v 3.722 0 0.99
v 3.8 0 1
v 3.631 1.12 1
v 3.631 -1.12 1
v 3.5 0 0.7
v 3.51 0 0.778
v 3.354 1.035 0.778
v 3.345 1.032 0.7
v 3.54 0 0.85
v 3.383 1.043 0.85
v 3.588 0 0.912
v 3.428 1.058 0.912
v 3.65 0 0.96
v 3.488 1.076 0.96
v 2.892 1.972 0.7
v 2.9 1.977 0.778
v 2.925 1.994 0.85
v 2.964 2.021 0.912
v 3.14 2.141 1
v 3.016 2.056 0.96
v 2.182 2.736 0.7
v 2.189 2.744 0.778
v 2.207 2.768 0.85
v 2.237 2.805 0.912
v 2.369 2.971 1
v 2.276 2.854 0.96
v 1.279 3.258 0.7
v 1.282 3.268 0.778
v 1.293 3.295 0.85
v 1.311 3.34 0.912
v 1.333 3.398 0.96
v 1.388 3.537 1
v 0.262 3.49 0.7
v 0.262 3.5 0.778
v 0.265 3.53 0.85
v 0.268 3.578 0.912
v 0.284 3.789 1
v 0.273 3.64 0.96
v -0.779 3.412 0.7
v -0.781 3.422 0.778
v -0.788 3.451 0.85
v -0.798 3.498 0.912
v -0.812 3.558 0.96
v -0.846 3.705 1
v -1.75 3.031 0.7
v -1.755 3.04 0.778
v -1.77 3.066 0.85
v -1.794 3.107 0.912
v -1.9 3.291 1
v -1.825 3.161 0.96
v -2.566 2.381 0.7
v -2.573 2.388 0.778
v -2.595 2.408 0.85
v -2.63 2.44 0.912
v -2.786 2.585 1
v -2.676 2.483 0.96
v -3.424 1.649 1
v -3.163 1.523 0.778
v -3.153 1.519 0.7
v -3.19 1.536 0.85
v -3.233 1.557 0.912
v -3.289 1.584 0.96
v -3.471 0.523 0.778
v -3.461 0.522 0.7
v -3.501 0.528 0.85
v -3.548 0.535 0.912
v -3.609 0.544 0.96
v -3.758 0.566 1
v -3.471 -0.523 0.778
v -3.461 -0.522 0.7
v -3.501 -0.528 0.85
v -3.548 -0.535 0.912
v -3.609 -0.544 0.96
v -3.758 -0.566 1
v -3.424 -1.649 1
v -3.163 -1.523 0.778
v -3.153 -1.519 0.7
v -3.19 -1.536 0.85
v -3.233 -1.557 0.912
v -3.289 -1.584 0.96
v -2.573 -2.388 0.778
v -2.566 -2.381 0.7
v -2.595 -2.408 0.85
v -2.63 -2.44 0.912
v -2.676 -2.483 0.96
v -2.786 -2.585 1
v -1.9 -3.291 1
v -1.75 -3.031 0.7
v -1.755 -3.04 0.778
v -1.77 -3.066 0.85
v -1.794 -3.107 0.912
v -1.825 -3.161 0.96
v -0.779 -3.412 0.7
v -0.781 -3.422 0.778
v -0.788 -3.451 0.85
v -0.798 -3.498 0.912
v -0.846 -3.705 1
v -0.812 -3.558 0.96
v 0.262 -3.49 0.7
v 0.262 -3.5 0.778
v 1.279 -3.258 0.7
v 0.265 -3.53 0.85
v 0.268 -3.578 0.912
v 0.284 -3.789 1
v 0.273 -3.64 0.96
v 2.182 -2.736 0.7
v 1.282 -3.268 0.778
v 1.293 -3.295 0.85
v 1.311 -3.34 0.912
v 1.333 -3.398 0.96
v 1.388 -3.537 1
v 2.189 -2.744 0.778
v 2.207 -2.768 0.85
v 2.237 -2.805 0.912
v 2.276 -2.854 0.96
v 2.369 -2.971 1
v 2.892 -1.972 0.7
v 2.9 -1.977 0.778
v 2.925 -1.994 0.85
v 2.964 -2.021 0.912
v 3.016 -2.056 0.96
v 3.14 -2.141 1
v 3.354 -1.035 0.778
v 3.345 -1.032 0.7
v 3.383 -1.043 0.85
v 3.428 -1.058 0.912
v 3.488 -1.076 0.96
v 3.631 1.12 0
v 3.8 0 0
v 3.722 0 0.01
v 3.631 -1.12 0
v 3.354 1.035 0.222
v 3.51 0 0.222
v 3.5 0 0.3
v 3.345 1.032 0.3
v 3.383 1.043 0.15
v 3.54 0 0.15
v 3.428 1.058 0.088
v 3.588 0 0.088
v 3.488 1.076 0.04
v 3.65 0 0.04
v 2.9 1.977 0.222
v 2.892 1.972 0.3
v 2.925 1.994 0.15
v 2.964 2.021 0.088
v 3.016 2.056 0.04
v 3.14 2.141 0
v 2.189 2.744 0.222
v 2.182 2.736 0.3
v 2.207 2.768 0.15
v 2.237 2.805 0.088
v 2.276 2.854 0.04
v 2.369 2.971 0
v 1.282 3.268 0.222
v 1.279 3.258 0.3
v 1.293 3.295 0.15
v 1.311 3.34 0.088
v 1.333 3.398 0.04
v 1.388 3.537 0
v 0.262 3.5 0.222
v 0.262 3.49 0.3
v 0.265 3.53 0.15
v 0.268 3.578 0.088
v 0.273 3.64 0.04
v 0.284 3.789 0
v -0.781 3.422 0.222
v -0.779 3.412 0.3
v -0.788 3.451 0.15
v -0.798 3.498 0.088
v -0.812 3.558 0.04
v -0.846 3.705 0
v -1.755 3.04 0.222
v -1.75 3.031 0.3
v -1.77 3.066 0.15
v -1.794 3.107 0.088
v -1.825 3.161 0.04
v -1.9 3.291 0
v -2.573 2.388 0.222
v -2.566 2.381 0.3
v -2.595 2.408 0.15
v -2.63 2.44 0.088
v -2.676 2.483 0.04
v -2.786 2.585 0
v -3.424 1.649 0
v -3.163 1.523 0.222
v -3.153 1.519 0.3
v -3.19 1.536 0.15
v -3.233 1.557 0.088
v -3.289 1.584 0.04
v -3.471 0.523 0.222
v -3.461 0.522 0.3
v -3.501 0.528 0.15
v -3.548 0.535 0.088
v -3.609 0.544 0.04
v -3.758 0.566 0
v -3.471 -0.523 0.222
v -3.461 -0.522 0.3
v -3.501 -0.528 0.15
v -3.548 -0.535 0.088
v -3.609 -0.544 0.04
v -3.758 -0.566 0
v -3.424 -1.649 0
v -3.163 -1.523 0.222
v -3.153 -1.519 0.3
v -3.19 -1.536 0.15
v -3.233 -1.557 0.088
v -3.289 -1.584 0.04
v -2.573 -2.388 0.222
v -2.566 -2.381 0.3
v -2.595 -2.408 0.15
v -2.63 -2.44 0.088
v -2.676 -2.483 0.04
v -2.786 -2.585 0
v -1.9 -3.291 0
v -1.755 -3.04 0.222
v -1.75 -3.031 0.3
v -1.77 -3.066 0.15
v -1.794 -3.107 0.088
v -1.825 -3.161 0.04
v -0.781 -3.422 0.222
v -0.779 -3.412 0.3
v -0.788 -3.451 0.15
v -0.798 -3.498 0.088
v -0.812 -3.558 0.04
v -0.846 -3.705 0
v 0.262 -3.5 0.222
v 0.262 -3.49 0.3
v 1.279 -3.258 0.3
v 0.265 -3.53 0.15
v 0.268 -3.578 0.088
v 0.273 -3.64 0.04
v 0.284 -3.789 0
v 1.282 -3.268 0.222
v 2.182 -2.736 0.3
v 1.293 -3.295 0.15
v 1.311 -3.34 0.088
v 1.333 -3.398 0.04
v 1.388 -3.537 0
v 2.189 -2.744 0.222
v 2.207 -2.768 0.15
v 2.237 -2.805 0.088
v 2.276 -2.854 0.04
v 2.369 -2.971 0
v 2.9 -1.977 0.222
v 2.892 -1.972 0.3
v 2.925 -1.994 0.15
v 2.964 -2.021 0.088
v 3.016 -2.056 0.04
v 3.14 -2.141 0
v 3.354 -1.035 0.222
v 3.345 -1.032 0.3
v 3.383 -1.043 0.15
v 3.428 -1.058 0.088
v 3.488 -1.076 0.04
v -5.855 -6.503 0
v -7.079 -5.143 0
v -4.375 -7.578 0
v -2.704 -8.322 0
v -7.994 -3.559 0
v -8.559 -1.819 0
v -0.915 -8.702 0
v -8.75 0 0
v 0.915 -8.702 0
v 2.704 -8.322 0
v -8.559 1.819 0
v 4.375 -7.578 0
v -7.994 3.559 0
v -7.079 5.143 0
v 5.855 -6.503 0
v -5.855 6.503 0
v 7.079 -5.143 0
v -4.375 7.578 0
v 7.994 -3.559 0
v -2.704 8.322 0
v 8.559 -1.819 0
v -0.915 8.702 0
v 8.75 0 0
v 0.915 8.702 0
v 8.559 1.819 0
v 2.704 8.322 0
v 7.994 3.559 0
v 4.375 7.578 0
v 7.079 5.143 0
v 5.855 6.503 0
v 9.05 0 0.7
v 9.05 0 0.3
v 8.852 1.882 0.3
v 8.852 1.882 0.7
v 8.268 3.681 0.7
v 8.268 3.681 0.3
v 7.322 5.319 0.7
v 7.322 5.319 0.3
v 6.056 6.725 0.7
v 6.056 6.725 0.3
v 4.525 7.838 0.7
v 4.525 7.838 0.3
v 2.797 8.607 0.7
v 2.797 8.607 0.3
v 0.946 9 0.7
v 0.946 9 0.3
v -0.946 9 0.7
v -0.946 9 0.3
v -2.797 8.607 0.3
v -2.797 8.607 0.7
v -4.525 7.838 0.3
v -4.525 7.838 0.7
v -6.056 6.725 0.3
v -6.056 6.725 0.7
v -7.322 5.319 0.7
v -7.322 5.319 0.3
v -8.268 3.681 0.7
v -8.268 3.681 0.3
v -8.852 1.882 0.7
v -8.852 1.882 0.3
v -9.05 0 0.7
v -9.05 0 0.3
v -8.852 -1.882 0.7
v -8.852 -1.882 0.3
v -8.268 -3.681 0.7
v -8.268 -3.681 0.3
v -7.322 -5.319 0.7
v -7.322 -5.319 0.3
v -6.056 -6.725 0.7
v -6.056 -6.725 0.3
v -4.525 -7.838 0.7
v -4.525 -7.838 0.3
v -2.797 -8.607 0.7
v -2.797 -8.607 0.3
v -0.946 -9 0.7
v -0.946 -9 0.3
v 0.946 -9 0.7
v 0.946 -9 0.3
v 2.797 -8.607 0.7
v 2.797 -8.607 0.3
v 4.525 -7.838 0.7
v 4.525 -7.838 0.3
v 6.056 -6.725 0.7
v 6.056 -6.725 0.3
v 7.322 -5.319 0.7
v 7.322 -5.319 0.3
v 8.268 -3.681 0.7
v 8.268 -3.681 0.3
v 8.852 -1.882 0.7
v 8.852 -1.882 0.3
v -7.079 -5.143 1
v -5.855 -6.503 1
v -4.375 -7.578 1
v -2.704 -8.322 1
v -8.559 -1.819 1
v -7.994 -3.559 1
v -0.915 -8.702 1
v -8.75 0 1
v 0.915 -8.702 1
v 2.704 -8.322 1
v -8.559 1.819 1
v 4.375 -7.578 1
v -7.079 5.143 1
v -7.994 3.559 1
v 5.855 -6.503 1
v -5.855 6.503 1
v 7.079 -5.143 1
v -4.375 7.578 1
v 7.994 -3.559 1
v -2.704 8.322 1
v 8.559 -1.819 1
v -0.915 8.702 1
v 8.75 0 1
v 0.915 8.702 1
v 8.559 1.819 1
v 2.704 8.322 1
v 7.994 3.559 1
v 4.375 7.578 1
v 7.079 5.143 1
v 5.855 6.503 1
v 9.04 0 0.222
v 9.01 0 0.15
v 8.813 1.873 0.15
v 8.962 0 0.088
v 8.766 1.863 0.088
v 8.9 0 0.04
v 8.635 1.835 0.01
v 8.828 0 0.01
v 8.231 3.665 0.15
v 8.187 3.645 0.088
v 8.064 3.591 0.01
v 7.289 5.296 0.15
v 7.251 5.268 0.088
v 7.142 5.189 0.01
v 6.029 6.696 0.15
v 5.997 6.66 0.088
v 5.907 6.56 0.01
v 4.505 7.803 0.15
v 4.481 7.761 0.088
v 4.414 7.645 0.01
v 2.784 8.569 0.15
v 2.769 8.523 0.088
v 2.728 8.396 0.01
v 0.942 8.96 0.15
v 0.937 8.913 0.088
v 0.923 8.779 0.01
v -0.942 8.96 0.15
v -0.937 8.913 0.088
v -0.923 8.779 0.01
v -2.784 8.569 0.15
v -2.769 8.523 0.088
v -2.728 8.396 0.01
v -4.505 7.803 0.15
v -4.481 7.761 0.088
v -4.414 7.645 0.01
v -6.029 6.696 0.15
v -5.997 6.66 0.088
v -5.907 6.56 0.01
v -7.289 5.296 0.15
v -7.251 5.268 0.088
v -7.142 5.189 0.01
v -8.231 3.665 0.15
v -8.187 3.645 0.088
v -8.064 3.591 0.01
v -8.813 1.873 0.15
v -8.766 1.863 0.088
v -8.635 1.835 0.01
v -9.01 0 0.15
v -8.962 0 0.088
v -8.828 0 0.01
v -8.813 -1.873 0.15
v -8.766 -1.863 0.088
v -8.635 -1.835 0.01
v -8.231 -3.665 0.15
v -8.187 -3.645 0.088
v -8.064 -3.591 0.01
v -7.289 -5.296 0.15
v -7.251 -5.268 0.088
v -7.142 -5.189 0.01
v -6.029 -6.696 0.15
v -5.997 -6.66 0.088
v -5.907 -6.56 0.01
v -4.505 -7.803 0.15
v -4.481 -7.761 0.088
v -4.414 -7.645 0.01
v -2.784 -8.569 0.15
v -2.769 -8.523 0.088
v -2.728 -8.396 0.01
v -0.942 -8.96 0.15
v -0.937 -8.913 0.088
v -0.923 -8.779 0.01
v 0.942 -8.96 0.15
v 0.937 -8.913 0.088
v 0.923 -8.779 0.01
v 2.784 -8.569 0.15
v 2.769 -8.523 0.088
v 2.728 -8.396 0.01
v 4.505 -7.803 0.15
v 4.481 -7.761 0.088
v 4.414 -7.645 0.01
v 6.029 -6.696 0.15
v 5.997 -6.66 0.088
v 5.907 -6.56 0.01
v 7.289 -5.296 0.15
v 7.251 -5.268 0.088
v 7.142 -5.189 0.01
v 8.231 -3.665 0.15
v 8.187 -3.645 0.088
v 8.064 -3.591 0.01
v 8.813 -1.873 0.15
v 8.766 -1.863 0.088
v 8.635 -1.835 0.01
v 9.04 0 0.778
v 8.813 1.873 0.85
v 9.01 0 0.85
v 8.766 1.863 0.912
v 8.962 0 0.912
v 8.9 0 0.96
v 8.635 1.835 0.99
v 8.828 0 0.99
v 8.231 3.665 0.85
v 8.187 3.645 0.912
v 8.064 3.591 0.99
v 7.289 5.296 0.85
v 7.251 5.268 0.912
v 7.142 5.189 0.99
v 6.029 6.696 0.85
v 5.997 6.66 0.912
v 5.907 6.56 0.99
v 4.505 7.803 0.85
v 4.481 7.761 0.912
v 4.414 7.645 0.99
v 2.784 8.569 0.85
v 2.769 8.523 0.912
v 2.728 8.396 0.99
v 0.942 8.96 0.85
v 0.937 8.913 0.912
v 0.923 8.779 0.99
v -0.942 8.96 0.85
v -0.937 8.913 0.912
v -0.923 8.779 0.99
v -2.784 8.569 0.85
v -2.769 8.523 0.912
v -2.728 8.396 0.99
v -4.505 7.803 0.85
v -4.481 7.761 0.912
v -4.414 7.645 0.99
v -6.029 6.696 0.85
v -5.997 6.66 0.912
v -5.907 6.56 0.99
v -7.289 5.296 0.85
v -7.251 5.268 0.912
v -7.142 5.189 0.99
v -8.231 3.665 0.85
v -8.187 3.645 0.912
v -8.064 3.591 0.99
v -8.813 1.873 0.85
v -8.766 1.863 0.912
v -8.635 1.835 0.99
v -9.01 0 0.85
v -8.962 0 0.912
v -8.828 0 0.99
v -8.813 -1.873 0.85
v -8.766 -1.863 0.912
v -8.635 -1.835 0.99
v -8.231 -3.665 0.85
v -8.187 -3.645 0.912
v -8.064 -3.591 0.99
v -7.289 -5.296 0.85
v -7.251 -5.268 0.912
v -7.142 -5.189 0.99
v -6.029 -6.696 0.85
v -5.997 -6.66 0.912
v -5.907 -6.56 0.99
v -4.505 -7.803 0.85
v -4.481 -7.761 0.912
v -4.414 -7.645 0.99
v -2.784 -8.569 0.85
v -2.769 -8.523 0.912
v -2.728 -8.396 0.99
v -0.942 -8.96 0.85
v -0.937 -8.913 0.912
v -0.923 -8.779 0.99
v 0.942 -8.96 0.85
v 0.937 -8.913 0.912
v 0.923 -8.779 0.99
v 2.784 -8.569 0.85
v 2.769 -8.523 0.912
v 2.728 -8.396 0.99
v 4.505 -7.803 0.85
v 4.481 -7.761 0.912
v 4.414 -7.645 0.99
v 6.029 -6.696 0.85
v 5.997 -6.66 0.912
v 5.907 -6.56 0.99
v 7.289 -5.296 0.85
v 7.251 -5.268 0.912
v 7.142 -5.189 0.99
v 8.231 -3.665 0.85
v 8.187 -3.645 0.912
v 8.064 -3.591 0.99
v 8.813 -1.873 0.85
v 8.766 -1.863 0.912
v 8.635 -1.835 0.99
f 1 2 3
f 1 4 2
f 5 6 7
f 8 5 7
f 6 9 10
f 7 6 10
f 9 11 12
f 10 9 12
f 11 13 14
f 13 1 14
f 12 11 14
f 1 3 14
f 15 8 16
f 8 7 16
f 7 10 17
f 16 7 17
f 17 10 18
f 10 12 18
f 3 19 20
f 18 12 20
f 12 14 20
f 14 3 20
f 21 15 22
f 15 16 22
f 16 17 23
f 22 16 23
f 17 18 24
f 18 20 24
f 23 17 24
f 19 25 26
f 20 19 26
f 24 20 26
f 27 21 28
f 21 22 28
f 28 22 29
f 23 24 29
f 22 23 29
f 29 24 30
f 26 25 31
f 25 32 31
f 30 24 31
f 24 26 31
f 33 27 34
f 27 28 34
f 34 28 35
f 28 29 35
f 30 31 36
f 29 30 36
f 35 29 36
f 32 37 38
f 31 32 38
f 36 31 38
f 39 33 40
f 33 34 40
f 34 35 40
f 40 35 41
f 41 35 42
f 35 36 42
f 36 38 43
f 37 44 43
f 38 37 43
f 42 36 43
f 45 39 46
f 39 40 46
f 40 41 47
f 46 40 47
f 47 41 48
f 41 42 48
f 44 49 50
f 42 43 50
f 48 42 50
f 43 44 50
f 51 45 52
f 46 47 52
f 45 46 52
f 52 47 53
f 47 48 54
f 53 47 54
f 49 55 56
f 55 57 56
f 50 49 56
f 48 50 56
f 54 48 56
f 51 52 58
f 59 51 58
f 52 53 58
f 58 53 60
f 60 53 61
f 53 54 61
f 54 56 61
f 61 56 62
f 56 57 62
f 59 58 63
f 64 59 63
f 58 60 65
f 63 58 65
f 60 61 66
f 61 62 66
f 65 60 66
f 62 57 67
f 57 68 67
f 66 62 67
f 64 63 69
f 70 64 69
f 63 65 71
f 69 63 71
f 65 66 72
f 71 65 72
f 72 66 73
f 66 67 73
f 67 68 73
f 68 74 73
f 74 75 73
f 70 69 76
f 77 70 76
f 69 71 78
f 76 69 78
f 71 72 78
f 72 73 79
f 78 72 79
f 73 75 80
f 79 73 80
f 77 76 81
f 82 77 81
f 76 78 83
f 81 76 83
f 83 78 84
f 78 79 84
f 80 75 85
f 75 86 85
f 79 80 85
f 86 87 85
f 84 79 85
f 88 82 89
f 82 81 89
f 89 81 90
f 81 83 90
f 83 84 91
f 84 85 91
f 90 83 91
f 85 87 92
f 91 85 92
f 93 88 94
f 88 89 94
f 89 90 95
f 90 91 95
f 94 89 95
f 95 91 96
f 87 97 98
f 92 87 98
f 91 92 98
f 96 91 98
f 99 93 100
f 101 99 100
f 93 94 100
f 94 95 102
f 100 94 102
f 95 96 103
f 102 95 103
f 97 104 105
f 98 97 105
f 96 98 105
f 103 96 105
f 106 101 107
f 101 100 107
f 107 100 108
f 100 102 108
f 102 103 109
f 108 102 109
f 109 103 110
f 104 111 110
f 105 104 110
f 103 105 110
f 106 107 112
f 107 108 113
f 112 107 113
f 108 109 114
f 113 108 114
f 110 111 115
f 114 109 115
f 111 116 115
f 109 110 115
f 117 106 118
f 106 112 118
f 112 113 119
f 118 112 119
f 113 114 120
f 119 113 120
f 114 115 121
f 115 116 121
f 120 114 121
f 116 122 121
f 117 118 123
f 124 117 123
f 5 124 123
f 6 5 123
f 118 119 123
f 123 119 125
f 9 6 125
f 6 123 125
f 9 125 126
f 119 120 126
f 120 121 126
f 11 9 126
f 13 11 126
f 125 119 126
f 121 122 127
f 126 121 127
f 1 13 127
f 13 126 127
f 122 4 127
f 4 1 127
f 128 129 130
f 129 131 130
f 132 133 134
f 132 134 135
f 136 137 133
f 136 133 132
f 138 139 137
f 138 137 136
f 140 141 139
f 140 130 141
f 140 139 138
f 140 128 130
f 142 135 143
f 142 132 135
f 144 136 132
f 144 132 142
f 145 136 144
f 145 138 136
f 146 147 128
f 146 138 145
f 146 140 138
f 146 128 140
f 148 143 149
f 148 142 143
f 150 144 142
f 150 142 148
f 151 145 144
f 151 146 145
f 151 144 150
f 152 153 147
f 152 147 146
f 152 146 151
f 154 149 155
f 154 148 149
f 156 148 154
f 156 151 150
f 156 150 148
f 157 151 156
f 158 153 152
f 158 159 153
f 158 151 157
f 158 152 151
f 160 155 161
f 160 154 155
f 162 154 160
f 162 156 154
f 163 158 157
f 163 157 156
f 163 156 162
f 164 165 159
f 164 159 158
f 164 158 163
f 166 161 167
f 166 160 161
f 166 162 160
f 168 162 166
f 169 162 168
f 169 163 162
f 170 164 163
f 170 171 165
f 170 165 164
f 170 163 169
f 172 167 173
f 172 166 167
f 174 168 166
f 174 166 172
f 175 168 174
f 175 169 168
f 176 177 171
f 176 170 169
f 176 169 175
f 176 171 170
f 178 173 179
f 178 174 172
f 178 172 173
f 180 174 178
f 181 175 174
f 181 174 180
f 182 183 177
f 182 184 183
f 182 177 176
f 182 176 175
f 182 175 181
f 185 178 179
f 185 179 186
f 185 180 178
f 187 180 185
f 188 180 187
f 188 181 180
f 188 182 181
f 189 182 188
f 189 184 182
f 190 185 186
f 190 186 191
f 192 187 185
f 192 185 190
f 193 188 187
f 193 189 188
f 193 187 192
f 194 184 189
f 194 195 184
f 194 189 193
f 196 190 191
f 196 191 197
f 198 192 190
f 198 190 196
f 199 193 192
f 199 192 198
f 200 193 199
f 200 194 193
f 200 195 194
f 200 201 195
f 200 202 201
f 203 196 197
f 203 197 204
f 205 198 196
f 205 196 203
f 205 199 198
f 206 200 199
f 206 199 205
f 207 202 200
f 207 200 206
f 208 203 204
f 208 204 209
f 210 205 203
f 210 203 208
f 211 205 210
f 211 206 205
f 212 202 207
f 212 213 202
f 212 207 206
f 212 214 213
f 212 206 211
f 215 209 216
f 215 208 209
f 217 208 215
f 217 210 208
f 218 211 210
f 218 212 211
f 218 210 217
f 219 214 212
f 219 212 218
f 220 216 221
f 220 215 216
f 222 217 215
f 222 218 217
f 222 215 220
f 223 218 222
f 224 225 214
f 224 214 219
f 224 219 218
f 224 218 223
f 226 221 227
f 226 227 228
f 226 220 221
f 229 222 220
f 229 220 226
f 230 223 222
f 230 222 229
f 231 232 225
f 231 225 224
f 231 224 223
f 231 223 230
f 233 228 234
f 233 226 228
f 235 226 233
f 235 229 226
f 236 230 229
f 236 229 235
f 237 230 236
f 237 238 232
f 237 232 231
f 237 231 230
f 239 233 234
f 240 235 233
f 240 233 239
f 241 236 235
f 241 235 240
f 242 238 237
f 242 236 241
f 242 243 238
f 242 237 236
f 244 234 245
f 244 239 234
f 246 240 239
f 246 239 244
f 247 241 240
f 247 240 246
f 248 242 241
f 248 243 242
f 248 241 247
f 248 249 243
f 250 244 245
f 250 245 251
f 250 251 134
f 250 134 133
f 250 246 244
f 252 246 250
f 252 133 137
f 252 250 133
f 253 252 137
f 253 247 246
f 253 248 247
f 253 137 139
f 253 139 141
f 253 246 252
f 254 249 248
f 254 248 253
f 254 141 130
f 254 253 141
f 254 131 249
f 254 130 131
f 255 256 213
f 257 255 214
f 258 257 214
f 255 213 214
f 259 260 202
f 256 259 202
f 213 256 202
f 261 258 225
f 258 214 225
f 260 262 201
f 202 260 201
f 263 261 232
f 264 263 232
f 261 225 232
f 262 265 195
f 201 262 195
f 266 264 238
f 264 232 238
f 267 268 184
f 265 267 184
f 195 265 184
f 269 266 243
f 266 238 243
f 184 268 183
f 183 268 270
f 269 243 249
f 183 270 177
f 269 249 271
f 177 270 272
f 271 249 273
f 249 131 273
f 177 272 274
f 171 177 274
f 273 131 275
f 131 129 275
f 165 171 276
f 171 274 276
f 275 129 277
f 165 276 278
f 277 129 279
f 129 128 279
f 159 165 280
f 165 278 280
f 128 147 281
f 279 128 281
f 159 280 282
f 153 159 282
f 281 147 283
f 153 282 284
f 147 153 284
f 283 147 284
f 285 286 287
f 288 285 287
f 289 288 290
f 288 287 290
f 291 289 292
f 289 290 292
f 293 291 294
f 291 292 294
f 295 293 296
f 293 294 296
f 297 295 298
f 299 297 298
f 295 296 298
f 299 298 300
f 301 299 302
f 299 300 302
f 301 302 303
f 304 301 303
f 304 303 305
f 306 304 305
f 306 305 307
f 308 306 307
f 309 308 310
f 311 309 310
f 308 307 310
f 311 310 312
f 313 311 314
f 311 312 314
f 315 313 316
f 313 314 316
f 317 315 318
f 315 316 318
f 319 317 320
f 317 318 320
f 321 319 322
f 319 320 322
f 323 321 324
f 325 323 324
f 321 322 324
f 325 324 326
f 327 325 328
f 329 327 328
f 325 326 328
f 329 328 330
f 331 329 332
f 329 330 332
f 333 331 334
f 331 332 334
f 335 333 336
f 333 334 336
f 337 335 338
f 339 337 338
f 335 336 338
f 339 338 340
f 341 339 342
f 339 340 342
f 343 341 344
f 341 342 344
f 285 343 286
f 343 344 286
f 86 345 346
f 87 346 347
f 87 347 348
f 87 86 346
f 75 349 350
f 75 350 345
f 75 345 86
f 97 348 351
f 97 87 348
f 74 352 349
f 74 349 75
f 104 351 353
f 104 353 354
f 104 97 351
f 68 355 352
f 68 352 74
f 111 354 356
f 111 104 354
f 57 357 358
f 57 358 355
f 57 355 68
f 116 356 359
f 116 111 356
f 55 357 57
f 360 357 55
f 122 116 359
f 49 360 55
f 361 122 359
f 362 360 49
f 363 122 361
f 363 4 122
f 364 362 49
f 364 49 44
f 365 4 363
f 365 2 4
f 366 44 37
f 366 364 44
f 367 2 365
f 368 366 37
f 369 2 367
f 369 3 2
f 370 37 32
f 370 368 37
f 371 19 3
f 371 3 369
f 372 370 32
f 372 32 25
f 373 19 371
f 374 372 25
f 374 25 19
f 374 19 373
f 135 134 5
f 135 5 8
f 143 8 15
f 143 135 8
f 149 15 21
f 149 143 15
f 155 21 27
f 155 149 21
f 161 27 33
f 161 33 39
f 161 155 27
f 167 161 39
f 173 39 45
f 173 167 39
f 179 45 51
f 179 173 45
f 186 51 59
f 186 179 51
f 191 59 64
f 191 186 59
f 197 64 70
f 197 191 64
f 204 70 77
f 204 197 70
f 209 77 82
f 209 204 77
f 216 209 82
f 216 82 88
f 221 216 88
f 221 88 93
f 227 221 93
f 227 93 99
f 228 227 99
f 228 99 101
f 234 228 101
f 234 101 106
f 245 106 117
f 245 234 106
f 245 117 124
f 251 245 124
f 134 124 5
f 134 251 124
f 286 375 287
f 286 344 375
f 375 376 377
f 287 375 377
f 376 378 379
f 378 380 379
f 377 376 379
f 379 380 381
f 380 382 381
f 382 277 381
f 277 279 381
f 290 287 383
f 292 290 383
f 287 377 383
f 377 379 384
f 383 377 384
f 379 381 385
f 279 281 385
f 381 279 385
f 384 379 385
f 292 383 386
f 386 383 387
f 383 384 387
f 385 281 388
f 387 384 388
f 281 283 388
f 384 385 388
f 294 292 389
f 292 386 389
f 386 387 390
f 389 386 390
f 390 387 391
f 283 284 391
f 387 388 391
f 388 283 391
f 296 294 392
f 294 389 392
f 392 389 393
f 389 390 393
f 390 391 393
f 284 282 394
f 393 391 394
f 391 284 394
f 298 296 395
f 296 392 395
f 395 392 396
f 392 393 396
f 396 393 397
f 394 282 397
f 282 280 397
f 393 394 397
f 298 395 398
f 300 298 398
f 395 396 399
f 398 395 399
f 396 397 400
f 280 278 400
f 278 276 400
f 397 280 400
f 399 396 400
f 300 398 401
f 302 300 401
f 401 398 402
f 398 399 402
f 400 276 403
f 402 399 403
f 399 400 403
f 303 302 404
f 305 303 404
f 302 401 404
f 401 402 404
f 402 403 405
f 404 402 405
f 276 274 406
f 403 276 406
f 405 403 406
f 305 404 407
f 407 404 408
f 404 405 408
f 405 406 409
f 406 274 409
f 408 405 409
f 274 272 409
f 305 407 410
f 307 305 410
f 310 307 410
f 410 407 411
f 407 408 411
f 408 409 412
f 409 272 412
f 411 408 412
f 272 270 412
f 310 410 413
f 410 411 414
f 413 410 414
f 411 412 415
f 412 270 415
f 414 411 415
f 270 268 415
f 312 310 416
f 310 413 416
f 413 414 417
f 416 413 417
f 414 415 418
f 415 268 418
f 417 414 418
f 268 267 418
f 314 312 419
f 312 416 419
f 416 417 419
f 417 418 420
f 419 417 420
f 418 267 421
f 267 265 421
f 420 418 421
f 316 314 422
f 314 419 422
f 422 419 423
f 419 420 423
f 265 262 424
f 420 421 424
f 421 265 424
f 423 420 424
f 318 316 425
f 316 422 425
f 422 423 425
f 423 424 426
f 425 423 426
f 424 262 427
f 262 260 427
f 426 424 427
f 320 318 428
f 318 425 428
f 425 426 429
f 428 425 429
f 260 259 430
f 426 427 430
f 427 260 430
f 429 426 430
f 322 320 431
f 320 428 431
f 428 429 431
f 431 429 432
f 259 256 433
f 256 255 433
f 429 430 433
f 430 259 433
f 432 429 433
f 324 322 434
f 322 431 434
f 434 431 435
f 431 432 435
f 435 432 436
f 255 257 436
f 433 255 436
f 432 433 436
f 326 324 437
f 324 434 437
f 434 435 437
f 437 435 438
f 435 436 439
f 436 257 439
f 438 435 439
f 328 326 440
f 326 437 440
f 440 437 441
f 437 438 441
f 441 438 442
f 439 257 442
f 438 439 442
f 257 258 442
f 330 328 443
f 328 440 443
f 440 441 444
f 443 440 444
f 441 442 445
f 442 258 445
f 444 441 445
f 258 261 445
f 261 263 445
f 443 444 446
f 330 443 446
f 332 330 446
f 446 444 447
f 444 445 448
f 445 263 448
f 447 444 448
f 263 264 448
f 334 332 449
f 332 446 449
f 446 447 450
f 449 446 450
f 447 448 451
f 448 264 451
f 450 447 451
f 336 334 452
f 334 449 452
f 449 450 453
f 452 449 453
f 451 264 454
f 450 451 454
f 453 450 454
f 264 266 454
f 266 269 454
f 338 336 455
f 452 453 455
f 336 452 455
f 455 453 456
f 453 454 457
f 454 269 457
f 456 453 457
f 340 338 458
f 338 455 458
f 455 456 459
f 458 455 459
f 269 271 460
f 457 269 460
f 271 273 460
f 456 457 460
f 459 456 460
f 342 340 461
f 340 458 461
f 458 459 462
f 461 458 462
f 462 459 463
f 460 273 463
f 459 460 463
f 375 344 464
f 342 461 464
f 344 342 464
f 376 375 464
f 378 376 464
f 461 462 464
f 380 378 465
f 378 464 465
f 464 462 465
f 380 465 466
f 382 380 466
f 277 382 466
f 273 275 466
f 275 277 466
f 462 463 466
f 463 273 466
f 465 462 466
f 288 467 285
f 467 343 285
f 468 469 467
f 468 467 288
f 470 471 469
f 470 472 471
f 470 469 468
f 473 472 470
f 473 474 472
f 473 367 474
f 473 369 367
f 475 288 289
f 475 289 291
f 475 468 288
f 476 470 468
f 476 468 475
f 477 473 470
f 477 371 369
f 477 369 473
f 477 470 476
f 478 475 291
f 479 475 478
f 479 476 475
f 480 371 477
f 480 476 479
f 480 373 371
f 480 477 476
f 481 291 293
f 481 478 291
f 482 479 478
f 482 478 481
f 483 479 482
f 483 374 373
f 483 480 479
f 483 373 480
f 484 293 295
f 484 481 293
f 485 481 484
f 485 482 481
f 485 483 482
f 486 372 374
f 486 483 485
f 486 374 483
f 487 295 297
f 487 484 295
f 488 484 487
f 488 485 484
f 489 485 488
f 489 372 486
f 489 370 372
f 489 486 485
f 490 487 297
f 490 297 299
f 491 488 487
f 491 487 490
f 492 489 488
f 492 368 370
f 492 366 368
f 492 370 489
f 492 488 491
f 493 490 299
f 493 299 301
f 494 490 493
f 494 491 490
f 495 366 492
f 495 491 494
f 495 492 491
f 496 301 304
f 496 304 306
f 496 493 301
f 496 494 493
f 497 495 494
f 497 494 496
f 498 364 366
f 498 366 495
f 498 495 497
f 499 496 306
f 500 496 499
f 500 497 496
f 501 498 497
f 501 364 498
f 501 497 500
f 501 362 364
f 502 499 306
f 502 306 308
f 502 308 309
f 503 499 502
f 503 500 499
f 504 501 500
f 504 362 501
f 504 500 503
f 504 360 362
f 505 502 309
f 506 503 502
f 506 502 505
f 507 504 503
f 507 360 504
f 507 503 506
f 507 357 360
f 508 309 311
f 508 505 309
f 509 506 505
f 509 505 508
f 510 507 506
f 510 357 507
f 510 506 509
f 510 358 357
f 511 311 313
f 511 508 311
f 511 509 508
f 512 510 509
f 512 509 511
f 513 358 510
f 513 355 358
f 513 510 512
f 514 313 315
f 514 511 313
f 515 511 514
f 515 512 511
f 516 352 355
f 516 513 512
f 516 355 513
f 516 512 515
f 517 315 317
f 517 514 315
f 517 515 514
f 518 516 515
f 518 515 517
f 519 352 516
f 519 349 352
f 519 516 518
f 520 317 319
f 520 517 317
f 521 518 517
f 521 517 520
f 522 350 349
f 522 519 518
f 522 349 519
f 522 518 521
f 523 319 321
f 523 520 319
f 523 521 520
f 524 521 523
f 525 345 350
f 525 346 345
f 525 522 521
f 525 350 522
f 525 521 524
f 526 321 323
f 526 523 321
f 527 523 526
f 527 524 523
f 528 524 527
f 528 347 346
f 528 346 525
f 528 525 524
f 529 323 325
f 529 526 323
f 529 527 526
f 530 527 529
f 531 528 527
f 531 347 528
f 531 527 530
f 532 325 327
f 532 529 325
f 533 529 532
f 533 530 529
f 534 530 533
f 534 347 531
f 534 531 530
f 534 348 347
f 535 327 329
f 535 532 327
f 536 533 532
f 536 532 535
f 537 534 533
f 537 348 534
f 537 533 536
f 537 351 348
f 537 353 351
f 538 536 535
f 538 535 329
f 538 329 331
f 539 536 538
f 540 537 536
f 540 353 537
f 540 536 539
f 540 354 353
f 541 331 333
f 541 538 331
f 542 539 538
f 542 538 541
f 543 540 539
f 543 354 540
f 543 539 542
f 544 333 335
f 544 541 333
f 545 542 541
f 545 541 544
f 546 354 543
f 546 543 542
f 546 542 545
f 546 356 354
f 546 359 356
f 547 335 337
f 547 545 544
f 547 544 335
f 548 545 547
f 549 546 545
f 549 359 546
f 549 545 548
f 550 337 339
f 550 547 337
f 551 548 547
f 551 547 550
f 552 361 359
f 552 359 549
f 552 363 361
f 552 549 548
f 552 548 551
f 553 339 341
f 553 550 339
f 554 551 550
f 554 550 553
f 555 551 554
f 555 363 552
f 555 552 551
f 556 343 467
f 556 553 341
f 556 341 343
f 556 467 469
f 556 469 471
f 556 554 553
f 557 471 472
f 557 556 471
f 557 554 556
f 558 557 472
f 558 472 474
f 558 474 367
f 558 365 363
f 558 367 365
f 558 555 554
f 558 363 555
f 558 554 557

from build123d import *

# Parameters (mm, degrees)
ESBO_O1_R                = 9.05
ESBO_O1_R_2              = 3.5
RESSALTO_EXTRUS_O1_DEPTH = 1
FILETE1_R                = 0.3


with BuildPart() as part:
    # Esboço1 → Ressalto-extrusão1 (new body)
    with BuildSketch(Plane.XY):
        Circle(ESBO_O1_R)
        Circle(ESBO_O1_R_2, mode=Mode.SUBTRACT)
    extrude(amount=RESSALTO_EXTRUS_O1_DEPTH)

    # Filete1
    filete1_edges = [part.edges().sort_by_distance(p)[0] for p in [
        (-9.05, 0, 0),
        (-9.05, 0, 1),
        (-3.5, 0, 0),
        (-3.5, 0, 1),
    ]]
    fillet(filete1_edges, radius=FILETE1_R)


solid = part.part
